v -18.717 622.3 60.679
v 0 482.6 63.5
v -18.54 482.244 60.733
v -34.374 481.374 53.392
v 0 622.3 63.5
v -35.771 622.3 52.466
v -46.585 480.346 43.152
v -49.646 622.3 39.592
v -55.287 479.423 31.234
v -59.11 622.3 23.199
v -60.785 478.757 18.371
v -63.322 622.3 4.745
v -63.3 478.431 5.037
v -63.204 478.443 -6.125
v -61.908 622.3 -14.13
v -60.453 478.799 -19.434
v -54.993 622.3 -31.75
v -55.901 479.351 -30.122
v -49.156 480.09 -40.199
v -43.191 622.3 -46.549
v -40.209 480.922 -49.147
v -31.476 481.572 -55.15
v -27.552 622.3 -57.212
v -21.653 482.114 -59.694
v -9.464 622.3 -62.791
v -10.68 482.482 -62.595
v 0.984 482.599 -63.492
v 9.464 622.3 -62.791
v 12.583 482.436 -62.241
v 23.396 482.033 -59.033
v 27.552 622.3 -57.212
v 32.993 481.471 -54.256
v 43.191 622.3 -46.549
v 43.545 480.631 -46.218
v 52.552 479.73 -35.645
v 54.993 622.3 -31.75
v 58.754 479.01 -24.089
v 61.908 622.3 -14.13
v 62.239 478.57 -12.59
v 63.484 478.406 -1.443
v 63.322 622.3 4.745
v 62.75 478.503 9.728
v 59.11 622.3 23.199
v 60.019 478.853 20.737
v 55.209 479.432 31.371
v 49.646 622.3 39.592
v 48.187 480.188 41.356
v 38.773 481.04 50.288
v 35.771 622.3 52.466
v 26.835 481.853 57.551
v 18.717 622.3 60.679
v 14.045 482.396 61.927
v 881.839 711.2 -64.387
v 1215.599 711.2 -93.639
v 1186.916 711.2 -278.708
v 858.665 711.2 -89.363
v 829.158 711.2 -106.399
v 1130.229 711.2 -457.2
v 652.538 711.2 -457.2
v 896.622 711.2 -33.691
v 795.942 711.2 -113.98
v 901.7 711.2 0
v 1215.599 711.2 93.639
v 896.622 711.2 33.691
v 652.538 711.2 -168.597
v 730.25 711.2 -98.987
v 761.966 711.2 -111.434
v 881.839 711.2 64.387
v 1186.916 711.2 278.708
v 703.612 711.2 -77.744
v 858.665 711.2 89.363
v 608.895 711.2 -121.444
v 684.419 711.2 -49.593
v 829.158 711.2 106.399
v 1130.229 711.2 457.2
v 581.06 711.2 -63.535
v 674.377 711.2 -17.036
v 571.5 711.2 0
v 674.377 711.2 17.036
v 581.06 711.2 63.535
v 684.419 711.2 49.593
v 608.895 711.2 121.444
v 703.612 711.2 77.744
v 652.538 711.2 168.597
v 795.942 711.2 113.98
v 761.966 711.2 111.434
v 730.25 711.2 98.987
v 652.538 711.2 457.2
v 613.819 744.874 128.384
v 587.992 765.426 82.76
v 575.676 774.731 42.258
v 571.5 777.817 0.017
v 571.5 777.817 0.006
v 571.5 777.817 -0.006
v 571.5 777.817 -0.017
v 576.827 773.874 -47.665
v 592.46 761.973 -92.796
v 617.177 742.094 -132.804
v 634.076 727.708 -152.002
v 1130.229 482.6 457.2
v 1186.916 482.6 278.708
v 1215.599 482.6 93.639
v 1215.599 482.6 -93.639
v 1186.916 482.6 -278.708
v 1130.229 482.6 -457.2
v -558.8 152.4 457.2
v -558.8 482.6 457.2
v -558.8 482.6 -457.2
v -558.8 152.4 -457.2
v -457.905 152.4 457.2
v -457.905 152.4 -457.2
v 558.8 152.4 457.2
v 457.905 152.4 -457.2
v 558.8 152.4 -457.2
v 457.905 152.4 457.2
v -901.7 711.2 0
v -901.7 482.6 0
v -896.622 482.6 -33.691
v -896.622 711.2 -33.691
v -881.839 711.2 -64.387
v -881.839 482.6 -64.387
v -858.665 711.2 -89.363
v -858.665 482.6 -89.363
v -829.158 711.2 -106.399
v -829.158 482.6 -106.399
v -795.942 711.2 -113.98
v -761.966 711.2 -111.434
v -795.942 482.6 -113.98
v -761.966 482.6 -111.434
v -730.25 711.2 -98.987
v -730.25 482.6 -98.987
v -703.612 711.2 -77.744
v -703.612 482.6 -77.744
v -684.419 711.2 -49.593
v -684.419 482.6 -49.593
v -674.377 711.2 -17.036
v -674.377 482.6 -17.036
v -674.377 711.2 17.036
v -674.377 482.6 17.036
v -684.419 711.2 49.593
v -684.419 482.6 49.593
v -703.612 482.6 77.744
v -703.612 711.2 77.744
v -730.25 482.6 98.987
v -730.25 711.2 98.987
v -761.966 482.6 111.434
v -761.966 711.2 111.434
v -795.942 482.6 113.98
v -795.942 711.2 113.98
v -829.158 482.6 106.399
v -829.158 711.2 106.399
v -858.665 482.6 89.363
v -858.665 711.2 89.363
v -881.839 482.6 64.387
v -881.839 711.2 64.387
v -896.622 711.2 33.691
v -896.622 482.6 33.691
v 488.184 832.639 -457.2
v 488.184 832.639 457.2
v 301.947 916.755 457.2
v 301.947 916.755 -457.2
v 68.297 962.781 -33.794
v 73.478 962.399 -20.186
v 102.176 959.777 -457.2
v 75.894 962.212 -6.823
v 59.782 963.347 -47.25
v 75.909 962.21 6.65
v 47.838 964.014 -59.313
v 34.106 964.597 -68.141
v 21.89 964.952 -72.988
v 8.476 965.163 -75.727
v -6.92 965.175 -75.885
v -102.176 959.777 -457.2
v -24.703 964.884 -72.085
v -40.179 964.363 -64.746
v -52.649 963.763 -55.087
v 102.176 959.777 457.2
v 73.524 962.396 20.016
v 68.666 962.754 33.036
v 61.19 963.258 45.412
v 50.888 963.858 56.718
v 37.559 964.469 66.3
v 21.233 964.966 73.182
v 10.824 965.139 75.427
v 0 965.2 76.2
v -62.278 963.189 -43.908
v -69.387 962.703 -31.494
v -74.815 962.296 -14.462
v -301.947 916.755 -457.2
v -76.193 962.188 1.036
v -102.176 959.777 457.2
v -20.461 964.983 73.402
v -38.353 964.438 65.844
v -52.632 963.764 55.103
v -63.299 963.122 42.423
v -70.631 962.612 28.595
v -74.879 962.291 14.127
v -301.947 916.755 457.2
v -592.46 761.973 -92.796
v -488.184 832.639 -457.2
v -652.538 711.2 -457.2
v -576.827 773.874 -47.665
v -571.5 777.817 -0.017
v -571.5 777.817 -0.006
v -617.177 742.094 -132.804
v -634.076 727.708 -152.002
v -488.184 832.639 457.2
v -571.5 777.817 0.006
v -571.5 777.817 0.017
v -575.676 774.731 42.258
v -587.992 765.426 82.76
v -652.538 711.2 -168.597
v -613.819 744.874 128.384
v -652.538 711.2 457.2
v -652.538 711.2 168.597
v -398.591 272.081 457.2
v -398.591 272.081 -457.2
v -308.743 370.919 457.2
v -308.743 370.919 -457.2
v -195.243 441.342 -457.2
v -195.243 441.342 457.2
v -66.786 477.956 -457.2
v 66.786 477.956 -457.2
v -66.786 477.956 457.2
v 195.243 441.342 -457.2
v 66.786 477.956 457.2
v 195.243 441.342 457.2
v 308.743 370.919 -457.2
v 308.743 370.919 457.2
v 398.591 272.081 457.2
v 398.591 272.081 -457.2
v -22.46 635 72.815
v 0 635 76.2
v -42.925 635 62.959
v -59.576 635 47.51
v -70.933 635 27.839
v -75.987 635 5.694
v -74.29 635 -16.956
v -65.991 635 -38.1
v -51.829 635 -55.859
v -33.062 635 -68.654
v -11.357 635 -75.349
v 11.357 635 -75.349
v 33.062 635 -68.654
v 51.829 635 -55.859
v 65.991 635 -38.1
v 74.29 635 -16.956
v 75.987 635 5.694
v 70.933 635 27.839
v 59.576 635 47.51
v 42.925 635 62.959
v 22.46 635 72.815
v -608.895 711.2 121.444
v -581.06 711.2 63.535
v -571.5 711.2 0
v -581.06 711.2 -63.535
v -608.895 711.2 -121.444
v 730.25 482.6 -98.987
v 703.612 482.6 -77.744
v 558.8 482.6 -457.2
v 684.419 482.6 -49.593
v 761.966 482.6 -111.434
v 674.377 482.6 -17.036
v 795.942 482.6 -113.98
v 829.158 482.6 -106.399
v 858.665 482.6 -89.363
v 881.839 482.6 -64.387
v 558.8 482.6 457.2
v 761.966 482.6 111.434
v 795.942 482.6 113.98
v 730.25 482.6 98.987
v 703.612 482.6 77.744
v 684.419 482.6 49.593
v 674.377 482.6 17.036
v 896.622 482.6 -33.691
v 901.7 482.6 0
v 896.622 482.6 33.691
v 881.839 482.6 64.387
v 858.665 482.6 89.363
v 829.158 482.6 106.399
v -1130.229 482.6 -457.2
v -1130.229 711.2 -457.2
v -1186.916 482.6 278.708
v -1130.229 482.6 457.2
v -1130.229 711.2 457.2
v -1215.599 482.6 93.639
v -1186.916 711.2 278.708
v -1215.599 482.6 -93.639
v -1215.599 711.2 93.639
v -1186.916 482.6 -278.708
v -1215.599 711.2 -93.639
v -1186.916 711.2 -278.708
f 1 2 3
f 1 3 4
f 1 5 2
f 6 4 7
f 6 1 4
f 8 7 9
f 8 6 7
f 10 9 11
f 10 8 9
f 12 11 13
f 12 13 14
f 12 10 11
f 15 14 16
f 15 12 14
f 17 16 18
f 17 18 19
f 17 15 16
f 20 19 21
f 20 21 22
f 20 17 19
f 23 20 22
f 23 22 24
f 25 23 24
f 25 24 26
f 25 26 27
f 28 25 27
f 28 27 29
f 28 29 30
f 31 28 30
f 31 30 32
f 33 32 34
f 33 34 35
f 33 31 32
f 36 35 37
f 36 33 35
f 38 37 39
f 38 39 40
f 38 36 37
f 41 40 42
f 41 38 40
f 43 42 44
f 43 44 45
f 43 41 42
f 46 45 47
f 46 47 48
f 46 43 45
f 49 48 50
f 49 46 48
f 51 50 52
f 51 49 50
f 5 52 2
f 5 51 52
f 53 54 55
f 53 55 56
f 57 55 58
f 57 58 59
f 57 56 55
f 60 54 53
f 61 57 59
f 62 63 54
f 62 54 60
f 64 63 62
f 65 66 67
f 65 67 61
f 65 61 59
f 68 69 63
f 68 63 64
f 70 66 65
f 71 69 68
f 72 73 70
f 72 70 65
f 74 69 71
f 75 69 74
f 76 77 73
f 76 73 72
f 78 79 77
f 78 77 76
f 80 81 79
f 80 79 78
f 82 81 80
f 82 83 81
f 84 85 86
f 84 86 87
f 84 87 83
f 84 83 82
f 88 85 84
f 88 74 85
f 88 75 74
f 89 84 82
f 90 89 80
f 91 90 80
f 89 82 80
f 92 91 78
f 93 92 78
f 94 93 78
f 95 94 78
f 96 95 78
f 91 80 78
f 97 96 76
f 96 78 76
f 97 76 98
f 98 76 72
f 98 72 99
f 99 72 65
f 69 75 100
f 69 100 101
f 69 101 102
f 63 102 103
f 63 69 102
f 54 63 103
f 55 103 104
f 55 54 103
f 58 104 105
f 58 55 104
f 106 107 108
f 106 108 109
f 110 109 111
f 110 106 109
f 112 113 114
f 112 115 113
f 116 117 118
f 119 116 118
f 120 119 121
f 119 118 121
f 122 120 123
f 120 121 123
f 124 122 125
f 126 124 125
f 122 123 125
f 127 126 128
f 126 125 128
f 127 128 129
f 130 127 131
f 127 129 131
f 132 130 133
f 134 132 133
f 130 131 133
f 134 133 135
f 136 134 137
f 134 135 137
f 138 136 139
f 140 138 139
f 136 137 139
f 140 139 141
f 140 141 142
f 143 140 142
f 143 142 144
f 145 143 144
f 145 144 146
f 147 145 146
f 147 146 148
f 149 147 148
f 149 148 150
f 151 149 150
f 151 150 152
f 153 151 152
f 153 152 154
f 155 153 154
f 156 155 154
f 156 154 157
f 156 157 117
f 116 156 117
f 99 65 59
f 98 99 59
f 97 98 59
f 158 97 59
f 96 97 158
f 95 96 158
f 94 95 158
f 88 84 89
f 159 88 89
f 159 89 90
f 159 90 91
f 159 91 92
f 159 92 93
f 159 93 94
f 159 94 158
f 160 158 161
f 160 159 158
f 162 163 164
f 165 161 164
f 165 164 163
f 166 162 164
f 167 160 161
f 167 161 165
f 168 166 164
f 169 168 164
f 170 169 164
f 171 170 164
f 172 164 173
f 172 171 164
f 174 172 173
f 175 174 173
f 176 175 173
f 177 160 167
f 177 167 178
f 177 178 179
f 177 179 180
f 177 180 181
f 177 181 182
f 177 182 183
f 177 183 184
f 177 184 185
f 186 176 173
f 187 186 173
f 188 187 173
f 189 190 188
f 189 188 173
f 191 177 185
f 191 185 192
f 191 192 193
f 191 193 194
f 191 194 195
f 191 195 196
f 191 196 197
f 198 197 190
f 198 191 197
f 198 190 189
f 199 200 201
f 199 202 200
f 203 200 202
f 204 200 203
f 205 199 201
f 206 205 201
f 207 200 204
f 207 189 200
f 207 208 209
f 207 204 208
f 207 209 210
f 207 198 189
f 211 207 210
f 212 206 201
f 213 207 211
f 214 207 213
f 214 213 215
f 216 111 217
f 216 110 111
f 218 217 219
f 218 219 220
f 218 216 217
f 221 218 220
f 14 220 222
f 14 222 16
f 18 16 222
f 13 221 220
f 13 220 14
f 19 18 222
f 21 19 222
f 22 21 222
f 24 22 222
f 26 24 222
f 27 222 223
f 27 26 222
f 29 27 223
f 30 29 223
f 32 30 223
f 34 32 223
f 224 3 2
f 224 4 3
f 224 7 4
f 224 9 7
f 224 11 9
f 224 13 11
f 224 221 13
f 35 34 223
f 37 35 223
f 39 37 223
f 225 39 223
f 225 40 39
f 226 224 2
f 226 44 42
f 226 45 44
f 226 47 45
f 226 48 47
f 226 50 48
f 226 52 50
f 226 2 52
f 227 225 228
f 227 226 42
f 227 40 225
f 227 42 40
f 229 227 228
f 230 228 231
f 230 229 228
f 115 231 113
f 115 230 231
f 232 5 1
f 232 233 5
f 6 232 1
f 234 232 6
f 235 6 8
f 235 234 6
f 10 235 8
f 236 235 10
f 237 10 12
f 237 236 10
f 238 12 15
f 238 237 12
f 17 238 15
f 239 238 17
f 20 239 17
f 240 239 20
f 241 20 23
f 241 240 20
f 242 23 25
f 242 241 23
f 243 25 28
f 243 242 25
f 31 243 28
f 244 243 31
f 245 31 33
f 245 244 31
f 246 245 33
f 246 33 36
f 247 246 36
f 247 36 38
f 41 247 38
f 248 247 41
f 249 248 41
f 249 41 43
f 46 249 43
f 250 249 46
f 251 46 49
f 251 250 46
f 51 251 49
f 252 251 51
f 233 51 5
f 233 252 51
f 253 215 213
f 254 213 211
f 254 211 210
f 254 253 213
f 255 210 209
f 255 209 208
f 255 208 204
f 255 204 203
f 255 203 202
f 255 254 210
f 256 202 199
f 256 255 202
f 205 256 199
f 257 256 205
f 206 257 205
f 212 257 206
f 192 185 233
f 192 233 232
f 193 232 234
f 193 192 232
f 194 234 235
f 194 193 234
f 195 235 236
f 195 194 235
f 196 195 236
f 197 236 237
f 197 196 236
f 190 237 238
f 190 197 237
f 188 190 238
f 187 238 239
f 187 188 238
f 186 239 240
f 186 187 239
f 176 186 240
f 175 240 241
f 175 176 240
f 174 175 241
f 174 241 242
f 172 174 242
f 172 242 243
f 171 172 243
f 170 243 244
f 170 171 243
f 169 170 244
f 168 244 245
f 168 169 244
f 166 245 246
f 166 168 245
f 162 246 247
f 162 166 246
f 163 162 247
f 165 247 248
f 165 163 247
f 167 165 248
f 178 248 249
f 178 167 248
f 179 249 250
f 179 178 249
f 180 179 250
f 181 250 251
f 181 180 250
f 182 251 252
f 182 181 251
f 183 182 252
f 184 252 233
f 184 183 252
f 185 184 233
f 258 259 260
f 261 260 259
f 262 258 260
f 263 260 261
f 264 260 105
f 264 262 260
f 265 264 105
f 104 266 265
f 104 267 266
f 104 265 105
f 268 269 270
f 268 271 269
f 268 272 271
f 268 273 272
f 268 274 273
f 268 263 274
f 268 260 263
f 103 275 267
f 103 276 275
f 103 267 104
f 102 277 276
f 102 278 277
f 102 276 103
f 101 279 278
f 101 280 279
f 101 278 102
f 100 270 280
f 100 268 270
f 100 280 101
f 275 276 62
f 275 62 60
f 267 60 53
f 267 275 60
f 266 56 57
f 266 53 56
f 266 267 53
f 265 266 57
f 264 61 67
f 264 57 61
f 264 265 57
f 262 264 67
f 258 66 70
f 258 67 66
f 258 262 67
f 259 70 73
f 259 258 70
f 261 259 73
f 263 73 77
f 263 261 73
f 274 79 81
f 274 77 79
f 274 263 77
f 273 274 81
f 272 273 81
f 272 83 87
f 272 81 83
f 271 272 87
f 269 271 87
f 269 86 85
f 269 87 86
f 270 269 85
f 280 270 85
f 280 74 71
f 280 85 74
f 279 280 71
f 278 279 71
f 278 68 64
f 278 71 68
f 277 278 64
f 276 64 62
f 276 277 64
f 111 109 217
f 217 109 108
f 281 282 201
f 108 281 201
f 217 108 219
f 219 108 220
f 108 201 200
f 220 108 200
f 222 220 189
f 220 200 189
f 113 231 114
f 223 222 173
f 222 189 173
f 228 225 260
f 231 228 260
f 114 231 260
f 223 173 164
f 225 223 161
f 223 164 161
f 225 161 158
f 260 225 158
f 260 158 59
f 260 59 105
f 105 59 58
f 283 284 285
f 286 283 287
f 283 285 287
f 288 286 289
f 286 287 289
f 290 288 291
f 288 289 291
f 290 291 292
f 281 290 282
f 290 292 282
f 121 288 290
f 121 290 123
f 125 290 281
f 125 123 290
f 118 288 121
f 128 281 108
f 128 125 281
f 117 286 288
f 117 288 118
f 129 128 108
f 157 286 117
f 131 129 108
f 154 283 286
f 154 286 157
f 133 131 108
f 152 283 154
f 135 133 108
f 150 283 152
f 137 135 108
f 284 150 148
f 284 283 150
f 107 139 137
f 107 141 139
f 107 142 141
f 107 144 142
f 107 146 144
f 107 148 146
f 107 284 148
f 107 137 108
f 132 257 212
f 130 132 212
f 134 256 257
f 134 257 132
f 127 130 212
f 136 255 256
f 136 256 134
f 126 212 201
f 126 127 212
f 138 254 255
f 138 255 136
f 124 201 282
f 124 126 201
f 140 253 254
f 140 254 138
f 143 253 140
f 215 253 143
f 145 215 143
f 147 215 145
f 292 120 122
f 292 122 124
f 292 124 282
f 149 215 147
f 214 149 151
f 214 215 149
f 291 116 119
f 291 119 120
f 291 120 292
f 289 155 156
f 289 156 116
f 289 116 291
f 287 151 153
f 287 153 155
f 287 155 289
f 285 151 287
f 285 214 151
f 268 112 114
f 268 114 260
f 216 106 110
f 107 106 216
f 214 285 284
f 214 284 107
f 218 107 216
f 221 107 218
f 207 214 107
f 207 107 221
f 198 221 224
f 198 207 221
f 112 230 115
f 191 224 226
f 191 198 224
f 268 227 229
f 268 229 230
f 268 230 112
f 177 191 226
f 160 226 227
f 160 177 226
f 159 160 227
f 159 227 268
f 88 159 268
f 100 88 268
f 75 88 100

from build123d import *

# Parameters (mm, degrees)
BOSS_EXTRUDE1_DEPTH              = 457.2
F_97_0_0059_DIAMETER_HOLE1_D     = 228.6
F_97_0_0059_DIAMETER_HOLE1_DEPTH = 228.601
CUT_EXTRUDE1_DEPTH               = 66.616681
CUT_EXTRUDE2_REACH               = 560.8


with BuildPart() as part:
    # Sketch1 → Boss-Extrude1 (new body, symmetric)
    with BuildSketch(Plane.XY):
        with BuildLine():
            Line((457.905011984, 152.4), (558.8, 152.4))
            Line((558.8, 152.4), (558.8, 482.6))
            Line((558.8, 482.6), (1270, 482.6))
            Line((1270, 482.6), (1270, 711.2))
            Line((1270, 711.2), (652.537814996, 711.2))
            ThreePointArc((652.537814996, 711.2), (0, 965.2), (-652.537814996, 711.2))
            Line((-652.537814996, 711.2), (-1270, 711.2))
            Line((-1270, 711.2), (-1270, 482.6))
            Line((-1270, 482.6), (-558.8, 482.6))
            Line((-558.8, 482.6), (-558.8, 152.4))
            Line((-558.8, 152.4), (-457.905011984, 152.4))
            ThreePointArc((-457.905011984, 152.4), (0, 482.6), (457.905011984, 152.4))
        make_face()
    extrude(amount=BOSS_EXTRUDE1_DEPTH, both=True)

    # #97 (0.0059) Diameter Hole1
    with Locations(Plane(origin=(0, 711.2, 0), x_dir=(1, 0, 0), z_dir=(0, 1, 0))):
        with Locations((-787.4, 0)):
            f_97_0_0059_diameter_hole1 = Hole(F_97_0_0059_DIAMETER_HOLE1_D / 2, depth=F_97_0_0059_DIAMETER_HOLE1_DEPTH)

    # Mirror7: #97 (0.0059) Diameter Hole1 across plane
    add(f_97_0_0059_diameter_hole1.mirror(Plane(origin=(0, 0, 0), x_dir=(0, 0, 1), z_dir=(1, 0, 0))), mode=Mode.SUBTRACT)

    # Sketch5 → Cut-Extrude1 (cut)
    with BuildSketch(Plane(origin=(0, 711.2, 0), x_dir=(1, 0, 0), z_dir=(0, 1, 0))):
        with BuildLine():
            Line((-652.537814996, 168.597156133), (-652.537814996, -168.597156133))
            ThreePointArc((-652.537814996, -168.597156133), (-571.5, 0), (-652.537814996, 168.597156133))
        make_face()
    cut_extrude1 = extrude(amount=CUT_EXTRUDE1_DEPTH, mode=Mode.SUBTRACT)

    # Mirror8: Cut-Extrude1 across plane
    add(cut_extrude1.mirror(Plane(origin=(0, 0, 0), x_dir=(0, 0, 1), z_dir=(1, 0, 0))), mode=Mode.SUBTRACT)

    # Sketch6 → Cut-Extrude2 (cut, up to next)
    with BuildSketch(Plane(origin=(0, 711.2, 0), x_dir=(1, 0, 0), z_dir=(0, 1, 0)), mode=Mode.PRIVATE) as cut_extrude2_sk1:
        with BuildLine():
            Line((-1130.228649433, 457.2), (-1270, 457.2))
            Line((-1270, 457.2), (-1270, -457.2))
            Line((-1270, -457.2), (-1130.228649433, -457.2))
            ThreePointArc((-1130.228649433, -457.2), (-1219.2, 0), (-1130.228649433, 457.2))
        make_face()
    cut_extrude2_tool1 = extrude(cut_extrude2_sk1.sketch, amount=-CUT_EXTRUDE2_REACH, mode=Mode.PRIVATE) & part.part
    add(cut_extrude2_tool1.solids().sort_by_distance((-1225.646525, 711.2, 0))[0], mode=Mode.SUBTRACT)
    # Sketch6 → Cut-Extrude2 (cut, up to next)
    with BuildSketch(Plane(origin=(0, 711.2, 0), x_dir=(1, 0, 0), z_dir=(0, 1, 0)), mode=Mode.PRIVATE) as cut_extrude2_sk2:
        with BuildLine():
            Line((1130.228649433, 457.2), (1270, 457.2))
            Line((1270, 457.2), (1270, -457.2))
            Line((1270, -457.2), (1130.228649433, -457.2))
            ThreePointArc((1130.228649433, -457.2), (1219.2, 0), (1130.228649433, 457.2))
        make_face()
    cut_extrude2_tool2 = extrude(cut_extrude2_sk2.sketch, amount=-CUT_EXTRUDE2_REACH, mode=Mode.PRIVATE) & part.part
    add(cut_extrude2_tool2.solids().sort_by_distance((1225.646525, 711.2, 0))[0], mode=Mode.SUBTRACT)

    # Sketch10 → CSK for M10 Flat Head Machine Screw1 (revolve, cut)
    with BuildSketch(Plane(origin=(0, 965.2, 0), x_dir=(0, 0, 1), z_dir=(1, 0, 0))):
        Polygon((0, 0), (0, 3060.754649308), (63.5, 3022.6), (63.5, 342.9), (76.2, 330.2), (76.2, 0), align=None)
    revolve(axis=Axis((0, 971.55, 0), (0, -1, 0)), mode=Mode.SUBTRACT)


solid = part.part
